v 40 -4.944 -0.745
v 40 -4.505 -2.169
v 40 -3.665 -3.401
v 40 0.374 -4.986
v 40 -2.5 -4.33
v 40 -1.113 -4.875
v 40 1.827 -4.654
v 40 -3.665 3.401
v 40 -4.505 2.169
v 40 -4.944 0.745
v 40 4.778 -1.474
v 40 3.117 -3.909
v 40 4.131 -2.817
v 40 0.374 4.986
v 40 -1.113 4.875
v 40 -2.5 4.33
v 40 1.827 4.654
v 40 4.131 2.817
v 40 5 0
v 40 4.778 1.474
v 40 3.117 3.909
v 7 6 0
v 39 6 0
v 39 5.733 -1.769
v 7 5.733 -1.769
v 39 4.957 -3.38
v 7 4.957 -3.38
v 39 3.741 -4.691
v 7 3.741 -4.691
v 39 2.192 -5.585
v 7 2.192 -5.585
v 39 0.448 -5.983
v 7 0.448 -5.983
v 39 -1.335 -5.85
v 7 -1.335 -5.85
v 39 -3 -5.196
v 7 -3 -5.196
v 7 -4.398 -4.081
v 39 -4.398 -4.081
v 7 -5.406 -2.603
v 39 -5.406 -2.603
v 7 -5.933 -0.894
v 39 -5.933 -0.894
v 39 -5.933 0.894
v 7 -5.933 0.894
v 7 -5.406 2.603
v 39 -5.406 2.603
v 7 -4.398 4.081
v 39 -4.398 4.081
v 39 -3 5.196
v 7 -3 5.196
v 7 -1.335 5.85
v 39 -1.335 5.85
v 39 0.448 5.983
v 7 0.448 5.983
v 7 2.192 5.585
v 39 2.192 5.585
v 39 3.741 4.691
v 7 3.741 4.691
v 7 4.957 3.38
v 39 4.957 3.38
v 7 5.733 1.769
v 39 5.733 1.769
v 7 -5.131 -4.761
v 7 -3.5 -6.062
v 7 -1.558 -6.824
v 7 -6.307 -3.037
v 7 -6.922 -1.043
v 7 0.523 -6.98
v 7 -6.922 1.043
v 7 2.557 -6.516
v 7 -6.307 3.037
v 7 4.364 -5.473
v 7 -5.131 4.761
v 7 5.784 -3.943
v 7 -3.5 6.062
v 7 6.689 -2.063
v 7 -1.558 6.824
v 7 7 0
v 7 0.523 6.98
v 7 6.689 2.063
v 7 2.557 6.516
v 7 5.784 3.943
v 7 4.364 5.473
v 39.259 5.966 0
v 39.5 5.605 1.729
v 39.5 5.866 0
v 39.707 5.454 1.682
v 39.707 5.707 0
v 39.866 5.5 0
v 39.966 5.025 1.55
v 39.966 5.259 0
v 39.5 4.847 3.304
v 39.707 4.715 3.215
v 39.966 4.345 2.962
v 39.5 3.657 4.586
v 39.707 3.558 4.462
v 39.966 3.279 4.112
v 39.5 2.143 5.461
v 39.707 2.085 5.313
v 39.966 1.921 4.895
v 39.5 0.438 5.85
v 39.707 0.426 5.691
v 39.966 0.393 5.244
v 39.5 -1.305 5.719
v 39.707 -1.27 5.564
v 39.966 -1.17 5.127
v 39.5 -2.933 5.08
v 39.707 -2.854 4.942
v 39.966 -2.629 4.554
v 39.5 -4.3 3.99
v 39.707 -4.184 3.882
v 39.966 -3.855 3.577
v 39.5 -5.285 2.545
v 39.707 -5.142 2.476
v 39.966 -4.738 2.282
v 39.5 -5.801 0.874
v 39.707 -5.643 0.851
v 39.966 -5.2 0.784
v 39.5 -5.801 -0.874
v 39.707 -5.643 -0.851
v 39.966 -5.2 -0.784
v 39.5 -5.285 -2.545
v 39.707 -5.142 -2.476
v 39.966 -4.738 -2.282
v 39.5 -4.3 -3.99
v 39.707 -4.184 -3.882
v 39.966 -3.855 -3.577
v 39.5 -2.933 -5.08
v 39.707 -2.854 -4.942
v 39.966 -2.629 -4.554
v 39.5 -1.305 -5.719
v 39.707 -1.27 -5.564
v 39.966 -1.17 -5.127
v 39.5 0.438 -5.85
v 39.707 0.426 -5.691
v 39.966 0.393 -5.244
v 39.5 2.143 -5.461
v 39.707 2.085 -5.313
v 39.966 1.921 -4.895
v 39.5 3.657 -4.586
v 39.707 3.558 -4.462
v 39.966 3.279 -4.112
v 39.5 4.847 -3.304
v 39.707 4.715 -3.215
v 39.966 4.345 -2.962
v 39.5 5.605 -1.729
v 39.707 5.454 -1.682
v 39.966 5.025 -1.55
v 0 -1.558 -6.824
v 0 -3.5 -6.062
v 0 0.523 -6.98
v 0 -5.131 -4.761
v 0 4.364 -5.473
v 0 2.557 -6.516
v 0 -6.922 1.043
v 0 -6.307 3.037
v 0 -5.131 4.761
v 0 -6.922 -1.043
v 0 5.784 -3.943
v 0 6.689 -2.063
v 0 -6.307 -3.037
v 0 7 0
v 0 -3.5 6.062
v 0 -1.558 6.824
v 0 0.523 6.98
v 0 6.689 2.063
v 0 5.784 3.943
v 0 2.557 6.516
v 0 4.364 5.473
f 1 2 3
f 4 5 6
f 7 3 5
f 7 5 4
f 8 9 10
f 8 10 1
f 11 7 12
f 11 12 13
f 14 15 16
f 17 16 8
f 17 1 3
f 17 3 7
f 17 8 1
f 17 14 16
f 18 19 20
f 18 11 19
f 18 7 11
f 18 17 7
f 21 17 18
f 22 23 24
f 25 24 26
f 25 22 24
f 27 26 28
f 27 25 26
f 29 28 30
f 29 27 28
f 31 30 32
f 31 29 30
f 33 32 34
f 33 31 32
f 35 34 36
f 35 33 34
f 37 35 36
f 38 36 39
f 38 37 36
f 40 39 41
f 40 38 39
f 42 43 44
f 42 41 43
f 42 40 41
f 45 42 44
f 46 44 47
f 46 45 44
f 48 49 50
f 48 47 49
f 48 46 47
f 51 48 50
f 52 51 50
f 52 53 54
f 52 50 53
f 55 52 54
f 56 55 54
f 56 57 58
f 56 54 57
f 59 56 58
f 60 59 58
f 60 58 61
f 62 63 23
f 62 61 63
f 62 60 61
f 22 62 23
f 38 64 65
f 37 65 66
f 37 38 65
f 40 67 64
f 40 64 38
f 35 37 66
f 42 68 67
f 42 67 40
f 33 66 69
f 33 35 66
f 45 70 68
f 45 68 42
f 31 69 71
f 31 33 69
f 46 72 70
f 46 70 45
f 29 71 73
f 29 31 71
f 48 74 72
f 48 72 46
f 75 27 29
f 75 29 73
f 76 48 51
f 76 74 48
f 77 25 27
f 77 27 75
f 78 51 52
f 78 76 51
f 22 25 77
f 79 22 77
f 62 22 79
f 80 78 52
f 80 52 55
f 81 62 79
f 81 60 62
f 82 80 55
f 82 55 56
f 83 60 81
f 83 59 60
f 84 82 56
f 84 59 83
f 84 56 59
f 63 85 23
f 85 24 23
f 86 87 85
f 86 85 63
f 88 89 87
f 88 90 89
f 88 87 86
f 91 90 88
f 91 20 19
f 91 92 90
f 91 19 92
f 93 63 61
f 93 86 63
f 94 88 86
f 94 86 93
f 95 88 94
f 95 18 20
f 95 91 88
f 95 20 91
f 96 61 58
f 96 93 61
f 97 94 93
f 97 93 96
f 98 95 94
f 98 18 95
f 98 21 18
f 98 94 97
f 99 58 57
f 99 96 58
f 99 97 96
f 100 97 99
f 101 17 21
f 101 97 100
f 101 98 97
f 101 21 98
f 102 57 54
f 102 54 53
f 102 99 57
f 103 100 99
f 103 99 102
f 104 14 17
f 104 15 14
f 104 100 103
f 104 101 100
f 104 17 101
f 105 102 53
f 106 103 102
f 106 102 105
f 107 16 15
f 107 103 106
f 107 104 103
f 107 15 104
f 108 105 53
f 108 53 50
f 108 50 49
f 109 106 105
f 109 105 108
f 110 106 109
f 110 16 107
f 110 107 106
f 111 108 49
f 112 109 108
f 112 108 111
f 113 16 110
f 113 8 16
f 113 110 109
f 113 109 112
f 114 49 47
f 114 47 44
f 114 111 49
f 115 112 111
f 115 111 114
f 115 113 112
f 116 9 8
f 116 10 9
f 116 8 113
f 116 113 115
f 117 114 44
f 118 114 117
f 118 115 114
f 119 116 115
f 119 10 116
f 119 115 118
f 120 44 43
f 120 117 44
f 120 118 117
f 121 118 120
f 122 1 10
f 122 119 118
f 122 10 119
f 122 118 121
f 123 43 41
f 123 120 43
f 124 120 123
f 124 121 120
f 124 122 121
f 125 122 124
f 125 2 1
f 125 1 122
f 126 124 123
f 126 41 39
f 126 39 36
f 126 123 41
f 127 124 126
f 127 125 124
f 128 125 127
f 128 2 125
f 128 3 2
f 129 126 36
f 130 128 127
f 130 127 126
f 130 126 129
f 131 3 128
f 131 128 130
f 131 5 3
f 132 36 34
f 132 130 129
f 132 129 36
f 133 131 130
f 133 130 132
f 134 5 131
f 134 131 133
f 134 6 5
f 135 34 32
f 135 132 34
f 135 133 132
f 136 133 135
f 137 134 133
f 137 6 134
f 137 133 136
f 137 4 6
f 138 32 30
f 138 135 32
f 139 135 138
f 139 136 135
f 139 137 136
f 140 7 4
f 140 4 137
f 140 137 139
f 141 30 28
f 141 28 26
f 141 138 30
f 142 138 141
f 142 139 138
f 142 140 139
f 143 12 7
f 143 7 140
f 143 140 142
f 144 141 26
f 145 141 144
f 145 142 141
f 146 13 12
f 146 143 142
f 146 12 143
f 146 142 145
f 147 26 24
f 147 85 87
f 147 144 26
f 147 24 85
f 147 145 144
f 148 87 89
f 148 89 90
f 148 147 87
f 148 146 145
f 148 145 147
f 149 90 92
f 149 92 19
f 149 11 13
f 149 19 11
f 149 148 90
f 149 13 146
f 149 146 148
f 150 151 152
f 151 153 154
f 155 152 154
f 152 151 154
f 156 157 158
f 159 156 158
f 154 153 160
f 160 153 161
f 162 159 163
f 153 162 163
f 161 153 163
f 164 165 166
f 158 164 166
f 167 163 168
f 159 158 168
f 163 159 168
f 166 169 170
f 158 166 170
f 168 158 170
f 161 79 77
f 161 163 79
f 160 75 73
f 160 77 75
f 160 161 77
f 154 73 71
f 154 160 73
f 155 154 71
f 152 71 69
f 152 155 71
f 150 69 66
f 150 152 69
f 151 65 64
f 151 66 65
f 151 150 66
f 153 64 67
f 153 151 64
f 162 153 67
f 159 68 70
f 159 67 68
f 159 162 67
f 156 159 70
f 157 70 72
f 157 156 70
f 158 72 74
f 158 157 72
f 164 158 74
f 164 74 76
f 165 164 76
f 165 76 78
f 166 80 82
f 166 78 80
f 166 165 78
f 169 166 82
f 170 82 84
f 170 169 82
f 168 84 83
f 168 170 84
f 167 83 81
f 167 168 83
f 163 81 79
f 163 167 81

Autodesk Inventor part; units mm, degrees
ref_plane "YZ Plane" through (0, 0, 0) normal (1, 0, 0) x (0, 1, 0)
ref_plane "XZ Plane" through (0, 0, 0) normal (0, 1, 0) x (-1, 0, 0)
ref_plane "XY Plane" through (0, 0, 0) normal (0, 0, 1) x (1, 0, 0)
sketch "Sketch2" plane through (0, 0, 0) normal (1, 0, 0) x (0, 1, 0)
  circle A0 centre (0, 0) radius 7
  circle A1 centre (0, 0) radius 6
  dimension "d0" = 14
  dimension "d1" = 12
extrude "Extrusion1" add sketch "Sketch2" along normal blind 40 contours A1
extrude "Extrusion2" add sketch "Sketch2" along normal blind 7 contours A0 | A1
fillet "Fillet1" radius 1 1 edges at (40, -6, 0)
thread "Thread1" size "M12x1.75" class "6g" standard "ANSI Metric M Profile" length 30
properties part number "bolt_CPY" material "Steel, Cast"
